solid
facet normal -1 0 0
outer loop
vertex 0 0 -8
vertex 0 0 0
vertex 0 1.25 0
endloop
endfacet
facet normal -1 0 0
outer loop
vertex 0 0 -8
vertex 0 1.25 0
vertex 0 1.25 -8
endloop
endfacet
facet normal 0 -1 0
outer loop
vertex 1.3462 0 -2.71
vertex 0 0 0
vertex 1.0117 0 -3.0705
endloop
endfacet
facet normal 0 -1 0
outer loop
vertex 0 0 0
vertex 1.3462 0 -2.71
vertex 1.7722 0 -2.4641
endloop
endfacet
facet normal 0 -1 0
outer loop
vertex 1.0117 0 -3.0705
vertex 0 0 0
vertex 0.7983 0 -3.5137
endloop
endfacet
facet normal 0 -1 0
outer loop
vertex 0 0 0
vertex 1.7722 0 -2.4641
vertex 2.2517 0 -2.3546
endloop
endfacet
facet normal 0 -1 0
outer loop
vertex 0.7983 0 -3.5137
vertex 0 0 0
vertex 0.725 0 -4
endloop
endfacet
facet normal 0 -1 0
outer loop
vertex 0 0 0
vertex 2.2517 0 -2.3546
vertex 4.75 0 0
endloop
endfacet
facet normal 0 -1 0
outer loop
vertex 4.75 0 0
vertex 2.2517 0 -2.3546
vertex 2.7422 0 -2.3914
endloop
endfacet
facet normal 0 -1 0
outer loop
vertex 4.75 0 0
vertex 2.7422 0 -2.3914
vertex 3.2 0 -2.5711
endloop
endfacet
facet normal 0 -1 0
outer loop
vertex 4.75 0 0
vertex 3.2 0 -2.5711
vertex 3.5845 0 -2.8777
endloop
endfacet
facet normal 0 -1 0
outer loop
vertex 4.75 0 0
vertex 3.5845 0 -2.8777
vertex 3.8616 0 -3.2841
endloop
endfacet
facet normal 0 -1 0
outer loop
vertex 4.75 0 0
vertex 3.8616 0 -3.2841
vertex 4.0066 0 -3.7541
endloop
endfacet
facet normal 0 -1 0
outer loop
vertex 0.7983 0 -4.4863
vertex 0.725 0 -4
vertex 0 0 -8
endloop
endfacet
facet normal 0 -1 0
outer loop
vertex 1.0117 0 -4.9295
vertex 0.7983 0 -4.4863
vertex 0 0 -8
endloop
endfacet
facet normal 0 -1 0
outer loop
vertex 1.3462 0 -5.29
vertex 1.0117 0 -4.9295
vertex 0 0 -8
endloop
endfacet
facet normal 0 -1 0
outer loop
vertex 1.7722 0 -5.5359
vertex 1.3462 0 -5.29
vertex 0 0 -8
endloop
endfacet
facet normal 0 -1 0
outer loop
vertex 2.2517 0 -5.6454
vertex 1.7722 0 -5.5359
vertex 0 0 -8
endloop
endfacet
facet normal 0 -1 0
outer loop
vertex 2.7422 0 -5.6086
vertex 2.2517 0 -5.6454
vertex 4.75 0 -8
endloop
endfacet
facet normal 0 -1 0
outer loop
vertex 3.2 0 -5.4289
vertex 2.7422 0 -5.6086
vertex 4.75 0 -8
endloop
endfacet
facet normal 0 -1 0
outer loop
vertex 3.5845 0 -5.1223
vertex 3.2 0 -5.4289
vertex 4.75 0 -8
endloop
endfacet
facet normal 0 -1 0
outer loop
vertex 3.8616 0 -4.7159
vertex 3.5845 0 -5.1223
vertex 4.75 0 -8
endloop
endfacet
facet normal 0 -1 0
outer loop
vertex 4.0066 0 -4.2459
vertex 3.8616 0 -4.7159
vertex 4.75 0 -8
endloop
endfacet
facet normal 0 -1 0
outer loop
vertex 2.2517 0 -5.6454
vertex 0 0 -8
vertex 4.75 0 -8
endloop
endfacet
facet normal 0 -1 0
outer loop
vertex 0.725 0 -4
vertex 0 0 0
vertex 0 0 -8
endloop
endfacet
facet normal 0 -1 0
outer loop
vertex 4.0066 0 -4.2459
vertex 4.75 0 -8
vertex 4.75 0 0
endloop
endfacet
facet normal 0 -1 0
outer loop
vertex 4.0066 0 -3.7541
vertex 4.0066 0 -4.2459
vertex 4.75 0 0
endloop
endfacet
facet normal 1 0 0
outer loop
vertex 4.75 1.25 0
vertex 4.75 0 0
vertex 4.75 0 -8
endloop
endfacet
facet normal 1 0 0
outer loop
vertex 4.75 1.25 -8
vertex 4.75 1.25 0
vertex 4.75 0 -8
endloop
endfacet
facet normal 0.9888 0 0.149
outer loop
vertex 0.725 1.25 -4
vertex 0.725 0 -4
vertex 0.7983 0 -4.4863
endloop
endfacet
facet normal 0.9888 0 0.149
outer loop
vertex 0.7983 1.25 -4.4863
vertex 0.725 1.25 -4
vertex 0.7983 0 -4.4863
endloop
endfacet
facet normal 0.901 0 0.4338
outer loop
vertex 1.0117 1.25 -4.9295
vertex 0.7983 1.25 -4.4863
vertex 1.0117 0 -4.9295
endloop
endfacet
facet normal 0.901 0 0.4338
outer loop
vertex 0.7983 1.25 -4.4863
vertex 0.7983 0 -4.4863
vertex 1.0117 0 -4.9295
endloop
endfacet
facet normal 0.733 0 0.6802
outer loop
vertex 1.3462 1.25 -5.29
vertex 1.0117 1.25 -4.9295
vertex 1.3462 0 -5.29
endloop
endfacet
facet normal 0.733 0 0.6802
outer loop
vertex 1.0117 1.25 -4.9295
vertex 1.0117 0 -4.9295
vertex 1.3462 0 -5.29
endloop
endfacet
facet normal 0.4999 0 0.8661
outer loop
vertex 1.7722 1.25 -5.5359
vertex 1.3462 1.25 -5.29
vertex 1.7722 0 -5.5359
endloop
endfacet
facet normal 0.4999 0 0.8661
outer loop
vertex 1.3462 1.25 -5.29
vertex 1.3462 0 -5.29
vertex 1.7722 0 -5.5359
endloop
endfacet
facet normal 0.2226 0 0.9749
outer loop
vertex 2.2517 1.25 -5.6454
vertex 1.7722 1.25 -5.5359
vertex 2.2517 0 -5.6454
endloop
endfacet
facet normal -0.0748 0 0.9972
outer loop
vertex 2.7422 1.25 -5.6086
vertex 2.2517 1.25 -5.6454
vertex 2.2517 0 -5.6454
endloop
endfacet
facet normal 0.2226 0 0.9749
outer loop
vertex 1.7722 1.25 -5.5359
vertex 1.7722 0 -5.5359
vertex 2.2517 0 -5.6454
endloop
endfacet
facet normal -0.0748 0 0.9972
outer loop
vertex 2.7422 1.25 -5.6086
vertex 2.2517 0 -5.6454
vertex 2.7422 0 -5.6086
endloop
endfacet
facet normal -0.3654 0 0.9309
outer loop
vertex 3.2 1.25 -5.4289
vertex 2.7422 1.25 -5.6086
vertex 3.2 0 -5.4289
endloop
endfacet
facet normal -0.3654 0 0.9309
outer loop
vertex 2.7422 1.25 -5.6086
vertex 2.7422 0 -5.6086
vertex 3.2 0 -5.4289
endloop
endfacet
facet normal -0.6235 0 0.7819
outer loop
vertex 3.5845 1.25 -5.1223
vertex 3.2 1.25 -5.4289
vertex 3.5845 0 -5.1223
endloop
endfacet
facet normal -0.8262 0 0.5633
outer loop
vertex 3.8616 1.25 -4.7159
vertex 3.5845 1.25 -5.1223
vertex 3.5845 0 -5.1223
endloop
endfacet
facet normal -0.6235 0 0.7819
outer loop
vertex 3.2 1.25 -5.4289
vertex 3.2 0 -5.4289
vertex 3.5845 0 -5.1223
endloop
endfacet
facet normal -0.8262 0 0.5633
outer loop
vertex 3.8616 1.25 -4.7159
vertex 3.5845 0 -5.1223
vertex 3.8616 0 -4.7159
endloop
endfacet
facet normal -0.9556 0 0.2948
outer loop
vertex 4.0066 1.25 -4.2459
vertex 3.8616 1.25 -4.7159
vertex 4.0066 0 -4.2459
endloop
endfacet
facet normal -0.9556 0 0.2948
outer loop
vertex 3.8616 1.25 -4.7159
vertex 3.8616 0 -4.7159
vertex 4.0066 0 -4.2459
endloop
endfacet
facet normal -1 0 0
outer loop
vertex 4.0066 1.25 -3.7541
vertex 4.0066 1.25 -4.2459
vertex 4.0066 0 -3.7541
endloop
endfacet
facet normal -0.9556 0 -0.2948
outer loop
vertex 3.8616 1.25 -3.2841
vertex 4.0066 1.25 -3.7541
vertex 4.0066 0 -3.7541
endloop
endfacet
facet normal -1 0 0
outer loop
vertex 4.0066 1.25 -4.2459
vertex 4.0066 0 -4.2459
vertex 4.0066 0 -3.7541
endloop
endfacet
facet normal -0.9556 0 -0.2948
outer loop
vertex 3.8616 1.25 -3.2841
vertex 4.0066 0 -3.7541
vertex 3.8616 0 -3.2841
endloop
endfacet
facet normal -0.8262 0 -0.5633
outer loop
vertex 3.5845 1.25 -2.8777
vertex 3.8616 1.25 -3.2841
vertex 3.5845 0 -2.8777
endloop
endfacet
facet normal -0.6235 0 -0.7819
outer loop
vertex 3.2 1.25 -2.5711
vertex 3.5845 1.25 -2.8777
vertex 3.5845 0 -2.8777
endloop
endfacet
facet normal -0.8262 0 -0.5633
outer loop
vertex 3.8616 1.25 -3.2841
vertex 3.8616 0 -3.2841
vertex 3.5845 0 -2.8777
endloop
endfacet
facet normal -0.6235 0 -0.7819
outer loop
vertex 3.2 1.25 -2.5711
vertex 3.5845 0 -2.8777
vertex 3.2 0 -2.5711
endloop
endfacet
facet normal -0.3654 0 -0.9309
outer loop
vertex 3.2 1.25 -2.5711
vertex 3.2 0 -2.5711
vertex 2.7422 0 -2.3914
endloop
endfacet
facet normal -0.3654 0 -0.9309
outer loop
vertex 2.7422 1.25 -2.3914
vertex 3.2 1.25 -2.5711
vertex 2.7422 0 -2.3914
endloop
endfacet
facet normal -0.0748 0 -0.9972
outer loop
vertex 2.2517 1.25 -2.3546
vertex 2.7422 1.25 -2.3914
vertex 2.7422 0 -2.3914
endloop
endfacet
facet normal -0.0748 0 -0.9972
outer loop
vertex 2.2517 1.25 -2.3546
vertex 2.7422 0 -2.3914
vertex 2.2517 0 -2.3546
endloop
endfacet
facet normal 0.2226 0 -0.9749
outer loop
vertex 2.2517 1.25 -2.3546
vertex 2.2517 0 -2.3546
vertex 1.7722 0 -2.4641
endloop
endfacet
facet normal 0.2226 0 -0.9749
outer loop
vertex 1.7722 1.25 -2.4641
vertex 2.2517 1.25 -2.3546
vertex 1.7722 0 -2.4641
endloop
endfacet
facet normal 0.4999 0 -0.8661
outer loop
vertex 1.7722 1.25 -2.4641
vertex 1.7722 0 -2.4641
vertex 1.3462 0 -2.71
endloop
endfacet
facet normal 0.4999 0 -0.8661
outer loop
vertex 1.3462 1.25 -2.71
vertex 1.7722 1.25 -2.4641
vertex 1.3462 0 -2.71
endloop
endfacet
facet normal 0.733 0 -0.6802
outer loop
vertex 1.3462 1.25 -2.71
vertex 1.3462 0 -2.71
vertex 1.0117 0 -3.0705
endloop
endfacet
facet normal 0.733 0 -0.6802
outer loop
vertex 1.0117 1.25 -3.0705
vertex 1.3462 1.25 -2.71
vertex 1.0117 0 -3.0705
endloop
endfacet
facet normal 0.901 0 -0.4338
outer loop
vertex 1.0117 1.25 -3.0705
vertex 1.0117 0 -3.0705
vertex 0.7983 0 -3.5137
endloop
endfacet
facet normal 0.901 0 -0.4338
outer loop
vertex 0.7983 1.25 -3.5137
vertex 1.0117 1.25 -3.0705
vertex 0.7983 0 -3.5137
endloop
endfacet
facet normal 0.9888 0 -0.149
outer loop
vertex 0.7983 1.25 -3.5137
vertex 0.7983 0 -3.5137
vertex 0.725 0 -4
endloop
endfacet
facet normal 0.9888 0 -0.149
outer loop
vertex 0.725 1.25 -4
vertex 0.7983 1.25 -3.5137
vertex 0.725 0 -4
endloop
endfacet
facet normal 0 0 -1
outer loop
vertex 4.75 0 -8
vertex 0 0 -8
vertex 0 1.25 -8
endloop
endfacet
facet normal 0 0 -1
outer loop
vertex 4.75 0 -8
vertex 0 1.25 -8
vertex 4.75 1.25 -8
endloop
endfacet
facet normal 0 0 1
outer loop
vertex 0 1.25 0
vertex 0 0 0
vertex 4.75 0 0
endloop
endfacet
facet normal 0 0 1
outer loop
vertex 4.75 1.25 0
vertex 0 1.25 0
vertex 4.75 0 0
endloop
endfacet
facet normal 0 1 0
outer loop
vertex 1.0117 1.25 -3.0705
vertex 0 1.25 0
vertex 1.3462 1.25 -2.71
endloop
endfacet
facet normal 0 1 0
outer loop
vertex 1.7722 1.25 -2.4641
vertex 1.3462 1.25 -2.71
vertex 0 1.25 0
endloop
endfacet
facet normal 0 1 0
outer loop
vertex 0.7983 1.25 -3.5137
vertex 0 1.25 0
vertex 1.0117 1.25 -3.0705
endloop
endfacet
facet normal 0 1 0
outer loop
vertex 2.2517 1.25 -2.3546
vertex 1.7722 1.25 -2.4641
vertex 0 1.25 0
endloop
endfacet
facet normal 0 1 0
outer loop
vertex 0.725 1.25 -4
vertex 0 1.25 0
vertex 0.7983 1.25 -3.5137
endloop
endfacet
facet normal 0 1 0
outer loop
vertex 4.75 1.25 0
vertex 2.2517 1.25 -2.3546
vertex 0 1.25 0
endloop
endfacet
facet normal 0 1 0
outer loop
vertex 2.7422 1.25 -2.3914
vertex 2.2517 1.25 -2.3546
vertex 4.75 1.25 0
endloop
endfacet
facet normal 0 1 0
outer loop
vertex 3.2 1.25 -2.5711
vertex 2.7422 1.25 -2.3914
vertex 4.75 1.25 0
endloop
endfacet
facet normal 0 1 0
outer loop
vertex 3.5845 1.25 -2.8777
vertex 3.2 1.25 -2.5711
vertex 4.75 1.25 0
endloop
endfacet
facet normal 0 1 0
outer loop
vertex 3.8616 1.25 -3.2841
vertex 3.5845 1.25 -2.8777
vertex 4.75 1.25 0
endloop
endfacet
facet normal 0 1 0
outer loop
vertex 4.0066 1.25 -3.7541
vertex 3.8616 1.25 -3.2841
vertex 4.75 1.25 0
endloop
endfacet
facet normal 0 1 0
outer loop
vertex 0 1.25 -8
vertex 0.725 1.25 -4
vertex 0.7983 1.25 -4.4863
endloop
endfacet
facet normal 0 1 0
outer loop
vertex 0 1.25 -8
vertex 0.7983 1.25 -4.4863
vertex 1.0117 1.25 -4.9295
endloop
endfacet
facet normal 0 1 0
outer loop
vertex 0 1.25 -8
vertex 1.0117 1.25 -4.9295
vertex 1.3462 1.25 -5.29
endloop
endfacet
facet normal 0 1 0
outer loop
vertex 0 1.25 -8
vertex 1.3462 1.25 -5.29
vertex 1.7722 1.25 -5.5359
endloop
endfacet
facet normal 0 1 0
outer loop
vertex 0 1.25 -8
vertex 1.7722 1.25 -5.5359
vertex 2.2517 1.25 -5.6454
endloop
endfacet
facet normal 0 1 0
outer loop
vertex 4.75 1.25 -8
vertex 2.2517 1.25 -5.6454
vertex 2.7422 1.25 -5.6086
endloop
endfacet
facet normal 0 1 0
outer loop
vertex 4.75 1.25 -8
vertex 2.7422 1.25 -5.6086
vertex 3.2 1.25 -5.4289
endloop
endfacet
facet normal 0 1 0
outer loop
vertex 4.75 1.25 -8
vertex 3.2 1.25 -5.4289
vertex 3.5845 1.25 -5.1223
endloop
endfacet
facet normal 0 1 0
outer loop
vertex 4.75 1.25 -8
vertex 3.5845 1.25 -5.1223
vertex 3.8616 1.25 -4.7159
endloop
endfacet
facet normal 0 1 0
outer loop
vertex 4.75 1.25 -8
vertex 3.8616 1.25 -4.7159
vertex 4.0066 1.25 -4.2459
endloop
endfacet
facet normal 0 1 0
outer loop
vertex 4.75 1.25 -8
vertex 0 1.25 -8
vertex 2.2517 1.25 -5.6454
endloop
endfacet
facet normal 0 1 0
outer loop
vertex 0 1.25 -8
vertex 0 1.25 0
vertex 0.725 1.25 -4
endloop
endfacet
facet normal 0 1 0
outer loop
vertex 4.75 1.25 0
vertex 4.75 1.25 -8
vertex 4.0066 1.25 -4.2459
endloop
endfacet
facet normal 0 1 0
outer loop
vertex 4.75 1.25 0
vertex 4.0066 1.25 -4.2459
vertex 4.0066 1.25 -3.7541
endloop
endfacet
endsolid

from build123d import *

# Parameters (mm, degrees)
SKETCH1_W             = 4.75
SKETCH1_H             = 8
BOSS_EXTRUDE1_DEPTH   = 1.25
M4X0_7_TAPPED_HOLE1_D = 3.3


with BuildPart() as part:
    # Sketch1 → Boss-Extrude1 (new body)
    with BuildSketch(Plane(origin=(0, 0, 0), x_dir=(1, 0, 0), z_dir=(0, 1, 0))):
        with Locations((2.375, 4)):
            Rectangle(SKETCH1_W, SKETCH1_H)
    extrude(amount=BOSS_EXTRUDE1_DEPTH)

    # M4x0.7 Tapped Hole1 (through all)
    with Locations(Plane(origin=(0, 1.25, 0), x_dir=(1, 0, 0), z_dir=(0, 1, 0))):
        with Locations((2.375, 4)):
            Hole(M4X0_7_TAPPED_HOLE1_D / 2)


solid = part.part
